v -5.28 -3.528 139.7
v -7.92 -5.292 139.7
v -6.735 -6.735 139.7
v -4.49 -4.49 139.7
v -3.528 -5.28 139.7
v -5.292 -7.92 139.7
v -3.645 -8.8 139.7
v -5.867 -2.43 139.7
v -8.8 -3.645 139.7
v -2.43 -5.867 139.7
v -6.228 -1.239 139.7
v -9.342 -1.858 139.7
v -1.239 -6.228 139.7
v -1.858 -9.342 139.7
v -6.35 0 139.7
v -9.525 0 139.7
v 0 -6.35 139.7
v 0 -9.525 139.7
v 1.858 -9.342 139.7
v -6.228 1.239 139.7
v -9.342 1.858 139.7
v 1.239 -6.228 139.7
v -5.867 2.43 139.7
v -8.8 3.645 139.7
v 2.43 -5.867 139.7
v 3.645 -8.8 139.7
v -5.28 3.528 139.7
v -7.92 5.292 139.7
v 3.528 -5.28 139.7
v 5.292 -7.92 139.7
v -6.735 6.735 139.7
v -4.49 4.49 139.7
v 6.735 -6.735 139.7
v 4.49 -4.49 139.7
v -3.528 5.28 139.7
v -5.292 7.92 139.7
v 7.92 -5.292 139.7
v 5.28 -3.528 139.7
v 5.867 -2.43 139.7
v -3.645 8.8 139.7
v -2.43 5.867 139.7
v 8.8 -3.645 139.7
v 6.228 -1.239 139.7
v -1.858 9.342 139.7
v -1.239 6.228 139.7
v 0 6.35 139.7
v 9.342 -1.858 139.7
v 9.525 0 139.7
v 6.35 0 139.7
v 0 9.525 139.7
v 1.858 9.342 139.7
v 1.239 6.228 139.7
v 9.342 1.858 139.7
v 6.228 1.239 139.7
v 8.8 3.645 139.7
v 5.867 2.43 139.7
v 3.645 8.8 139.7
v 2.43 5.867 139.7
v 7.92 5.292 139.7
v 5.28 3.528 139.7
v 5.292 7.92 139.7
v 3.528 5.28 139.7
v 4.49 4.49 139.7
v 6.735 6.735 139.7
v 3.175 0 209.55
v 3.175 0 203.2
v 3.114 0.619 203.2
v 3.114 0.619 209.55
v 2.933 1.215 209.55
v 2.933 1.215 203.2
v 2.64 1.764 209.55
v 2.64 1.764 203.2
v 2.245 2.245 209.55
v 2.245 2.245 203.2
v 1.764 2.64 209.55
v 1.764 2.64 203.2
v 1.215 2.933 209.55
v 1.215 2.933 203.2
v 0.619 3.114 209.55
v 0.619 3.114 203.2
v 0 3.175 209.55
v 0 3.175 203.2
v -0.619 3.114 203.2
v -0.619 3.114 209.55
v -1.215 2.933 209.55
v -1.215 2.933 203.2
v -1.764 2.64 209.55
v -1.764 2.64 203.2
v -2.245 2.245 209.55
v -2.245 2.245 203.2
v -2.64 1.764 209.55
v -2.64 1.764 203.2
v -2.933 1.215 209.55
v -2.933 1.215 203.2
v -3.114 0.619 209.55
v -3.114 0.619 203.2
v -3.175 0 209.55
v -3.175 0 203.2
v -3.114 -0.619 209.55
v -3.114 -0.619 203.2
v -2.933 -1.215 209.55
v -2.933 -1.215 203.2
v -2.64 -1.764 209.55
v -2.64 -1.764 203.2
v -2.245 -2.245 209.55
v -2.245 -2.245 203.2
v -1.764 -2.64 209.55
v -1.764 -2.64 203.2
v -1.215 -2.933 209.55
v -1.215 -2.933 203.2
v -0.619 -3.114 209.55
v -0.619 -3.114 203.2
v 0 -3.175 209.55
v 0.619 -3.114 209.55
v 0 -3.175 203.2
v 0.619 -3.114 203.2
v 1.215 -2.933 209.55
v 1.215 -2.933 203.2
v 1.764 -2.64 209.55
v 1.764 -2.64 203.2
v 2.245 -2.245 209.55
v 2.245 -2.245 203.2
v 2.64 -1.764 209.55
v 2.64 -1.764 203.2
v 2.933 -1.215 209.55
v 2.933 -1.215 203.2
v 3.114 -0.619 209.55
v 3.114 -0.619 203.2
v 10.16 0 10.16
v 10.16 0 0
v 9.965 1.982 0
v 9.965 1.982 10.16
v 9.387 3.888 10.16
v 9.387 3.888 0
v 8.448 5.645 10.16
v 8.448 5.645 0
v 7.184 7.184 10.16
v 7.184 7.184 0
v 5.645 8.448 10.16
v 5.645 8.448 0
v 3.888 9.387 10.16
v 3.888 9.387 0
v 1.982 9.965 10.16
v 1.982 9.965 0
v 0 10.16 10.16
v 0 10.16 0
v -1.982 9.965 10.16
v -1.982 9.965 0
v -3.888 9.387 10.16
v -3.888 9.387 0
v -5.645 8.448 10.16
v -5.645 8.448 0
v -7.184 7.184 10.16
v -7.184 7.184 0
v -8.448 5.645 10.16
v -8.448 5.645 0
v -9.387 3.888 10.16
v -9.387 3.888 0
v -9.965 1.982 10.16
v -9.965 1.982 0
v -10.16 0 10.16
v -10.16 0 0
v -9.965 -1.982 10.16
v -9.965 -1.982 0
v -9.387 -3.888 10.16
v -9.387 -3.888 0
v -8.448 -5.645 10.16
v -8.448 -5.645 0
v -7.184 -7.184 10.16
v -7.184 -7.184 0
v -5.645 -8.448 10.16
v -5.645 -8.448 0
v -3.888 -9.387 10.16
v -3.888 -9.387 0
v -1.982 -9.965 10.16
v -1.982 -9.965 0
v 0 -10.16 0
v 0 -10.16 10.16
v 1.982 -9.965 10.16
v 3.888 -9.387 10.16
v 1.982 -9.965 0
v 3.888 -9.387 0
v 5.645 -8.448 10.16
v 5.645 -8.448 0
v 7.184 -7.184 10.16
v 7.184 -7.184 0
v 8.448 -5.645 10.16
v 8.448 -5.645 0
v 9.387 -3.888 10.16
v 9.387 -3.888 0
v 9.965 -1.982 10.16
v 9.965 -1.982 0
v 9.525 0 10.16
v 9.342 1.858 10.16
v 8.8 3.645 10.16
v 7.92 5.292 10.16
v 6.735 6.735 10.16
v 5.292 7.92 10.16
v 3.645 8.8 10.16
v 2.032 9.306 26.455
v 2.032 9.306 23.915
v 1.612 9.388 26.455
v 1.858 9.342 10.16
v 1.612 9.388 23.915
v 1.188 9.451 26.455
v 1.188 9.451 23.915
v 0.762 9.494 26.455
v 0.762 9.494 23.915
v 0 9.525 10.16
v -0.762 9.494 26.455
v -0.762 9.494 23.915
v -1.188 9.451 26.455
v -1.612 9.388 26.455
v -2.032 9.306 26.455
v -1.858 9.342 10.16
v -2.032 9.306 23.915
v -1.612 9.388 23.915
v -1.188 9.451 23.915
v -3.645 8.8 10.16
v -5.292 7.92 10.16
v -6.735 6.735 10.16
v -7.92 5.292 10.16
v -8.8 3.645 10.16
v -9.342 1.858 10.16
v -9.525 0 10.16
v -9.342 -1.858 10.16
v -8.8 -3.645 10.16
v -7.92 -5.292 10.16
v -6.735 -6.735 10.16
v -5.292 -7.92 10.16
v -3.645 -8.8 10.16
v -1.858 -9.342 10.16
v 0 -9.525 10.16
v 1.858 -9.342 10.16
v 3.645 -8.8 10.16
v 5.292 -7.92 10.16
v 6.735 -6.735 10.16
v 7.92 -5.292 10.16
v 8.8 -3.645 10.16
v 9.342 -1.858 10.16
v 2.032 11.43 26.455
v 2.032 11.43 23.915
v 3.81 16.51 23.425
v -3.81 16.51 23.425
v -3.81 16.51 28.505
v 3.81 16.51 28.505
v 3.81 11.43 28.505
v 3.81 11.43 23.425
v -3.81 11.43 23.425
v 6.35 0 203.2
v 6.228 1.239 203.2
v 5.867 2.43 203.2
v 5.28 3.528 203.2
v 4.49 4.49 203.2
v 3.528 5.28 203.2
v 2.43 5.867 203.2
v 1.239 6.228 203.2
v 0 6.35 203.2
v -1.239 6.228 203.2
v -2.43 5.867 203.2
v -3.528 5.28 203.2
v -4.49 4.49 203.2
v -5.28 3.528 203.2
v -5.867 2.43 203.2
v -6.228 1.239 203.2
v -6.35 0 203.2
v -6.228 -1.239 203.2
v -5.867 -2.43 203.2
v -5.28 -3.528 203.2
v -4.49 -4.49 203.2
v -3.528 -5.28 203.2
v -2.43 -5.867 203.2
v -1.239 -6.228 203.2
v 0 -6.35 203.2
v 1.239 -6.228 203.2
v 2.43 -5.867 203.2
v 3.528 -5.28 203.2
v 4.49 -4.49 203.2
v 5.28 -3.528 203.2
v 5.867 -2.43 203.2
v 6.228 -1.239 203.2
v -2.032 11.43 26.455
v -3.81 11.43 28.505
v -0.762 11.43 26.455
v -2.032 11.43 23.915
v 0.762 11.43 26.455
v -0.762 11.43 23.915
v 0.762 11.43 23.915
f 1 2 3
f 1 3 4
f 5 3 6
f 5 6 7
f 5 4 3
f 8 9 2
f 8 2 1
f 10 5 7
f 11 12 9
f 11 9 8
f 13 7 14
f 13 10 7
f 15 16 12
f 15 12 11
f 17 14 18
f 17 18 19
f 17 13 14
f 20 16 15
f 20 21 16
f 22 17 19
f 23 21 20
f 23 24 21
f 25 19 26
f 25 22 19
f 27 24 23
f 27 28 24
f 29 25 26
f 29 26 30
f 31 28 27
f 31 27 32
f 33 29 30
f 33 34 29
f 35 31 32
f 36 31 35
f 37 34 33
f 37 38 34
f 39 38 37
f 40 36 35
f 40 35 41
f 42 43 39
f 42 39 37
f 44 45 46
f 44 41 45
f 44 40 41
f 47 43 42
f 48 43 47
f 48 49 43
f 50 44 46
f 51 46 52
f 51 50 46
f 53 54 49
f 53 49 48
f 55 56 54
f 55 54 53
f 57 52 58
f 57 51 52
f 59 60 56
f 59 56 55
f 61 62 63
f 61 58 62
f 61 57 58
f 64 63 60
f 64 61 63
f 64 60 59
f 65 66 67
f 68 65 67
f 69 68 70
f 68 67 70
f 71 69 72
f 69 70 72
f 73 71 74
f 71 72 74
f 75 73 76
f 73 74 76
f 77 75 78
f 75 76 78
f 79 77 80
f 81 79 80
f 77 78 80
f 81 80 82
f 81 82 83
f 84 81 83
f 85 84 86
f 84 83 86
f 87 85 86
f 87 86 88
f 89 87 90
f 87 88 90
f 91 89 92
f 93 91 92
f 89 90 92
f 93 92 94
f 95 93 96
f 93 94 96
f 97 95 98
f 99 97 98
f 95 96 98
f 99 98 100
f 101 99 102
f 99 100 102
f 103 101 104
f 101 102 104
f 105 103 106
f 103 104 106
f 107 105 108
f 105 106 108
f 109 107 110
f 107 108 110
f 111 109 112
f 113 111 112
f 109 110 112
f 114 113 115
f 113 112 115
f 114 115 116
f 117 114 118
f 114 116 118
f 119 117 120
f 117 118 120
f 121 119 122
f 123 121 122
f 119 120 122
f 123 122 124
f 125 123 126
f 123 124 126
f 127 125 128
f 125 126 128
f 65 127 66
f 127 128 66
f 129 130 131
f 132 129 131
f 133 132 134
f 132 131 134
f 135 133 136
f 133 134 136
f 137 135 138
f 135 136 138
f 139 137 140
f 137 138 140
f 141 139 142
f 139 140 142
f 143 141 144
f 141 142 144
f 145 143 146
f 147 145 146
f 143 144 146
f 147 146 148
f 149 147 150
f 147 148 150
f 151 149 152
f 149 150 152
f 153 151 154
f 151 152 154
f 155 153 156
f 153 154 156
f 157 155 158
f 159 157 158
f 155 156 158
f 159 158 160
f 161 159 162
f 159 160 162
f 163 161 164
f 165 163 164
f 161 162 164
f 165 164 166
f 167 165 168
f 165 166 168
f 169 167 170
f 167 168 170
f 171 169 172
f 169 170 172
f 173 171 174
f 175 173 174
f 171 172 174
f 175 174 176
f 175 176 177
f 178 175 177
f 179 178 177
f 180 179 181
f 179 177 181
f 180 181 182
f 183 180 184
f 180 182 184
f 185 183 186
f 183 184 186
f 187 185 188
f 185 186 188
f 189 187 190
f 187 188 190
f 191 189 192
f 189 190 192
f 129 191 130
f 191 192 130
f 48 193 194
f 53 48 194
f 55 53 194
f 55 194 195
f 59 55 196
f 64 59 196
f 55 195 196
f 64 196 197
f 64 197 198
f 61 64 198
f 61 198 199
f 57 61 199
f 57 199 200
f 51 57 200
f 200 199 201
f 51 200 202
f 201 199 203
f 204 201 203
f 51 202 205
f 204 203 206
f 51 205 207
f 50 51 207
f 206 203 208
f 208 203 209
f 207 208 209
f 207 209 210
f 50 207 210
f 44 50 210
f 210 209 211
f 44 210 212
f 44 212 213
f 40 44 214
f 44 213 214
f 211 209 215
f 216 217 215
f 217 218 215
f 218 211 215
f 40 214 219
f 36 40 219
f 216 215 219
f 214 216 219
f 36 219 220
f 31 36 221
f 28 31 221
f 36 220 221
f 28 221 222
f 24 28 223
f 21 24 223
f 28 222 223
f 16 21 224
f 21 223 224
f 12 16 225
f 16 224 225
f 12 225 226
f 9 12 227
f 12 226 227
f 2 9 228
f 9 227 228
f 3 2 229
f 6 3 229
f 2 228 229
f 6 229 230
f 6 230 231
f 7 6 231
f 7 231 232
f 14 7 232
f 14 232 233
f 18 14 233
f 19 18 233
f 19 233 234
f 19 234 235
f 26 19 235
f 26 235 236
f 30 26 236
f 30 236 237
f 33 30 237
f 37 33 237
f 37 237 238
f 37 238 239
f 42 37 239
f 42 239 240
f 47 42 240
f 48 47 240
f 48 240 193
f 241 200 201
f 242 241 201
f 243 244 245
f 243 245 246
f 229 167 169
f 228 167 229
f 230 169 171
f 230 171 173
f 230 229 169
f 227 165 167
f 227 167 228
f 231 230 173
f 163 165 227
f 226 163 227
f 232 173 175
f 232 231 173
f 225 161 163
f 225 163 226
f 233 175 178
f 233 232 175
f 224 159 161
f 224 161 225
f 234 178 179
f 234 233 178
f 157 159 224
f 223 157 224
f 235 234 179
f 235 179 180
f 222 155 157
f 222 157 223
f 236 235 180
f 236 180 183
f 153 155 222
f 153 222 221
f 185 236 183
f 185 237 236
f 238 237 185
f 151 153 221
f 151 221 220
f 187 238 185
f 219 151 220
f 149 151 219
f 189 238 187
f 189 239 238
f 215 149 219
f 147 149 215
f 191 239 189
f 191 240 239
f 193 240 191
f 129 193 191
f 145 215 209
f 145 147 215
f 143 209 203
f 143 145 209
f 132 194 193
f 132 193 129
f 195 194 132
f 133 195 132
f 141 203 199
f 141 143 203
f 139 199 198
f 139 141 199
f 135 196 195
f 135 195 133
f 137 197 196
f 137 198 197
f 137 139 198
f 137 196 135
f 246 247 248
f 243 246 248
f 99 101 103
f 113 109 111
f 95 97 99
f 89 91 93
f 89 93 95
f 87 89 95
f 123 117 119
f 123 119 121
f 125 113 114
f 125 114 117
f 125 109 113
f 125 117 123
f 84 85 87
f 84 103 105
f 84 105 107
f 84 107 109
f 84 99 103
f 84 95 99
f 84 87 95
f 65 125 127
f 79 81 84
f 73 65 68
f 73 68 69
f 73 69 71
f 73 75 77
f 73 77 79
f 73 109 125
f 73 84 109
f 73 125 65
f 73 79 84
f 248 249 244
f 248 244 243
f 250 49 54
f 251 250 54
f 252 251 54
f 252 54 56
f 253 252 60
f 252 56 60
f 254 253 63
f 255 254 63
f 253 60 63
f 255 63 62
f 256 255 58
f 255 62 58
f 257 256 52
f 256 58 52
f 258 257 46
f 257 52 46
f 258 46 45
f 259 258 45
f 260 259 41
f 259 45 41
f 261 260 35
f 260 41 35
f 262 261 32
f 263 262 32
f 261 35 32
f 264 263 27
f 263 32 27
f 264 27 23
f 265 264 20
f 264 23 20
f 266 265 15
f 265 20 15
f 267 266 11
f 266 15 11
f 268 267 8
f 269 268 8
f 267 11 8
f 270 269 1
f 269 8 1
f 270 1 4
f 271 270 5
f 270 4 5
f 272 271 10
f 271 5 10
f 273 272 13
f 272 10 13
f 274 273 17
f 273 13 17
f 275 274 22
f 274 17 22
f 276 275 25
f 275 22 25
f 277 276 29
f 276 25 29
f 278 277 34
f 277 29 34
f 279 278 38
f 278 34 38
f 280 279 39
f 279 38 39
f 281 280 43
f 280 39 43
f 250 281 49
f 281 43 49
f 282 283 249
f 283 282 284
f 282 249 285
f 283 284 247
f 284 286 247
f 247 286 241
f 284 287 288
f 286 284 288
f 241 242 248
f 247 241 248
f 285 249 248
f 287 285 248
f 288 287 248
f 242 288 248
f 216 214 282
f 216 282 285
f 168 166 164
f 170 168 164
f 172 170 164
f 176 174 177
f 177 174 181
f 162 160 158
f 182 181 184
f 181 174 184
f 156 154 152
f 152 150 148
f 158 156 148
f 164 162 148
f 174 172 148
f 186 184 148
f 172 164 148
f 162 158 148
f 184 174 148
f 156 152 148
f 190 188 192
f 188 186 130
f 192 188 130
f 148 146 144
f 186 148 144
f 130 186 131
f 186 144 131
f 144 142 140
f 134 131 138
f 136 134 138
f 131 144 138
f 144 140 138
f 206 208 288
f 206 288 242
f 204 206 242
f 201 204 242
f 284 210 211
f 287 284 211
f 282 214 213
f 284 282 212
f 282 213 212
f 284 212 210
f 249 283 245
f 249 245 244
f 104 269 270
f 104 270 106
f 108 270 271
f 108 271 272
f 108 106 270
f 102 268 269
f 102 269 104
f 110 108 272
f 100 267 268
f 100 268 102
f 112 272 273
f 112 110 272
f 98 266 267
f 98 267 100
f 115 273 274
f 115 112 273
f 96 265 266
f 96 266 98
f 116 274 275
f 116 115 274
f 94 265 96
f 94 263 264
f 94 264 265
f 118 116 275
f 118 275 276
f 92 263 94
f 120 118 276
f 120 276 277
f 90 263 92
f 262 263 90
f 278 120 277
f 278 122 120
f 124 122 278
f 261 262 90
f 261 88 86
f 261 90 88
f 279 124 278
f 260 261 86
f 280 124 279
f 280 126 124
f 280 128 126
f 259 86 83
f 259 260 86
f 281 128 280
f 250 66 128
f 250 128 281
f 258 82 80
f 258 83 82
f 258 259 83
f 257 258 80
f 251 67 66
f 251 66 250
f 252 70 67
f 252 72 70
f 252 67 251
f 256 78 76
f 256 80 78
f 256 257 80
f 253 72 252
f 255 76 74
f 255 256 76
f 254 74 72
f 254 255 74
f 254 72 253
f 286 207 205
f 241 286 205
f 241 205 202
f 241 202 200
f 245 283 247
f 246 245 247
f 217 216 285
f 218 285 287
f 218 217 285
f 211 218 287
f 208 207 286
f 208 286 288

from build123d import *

# Parameters (mm, degrees)
SKETCH2_R            = 10.16
BOSS_EXTRUDE1_DEPTH  = 10.16
SKETCH3_R            = 9.525
BOSS_EXTRUDE2_DEPTH  = 129.54
SKETCH4_R            = 6.35
BOSS_EXTRUDE4_DEPTH  = 63.5
SKETCH5_R            = 3.175
BOSS_EXTRUDE5_DEPTH  = 6.35
SKETCH8_W            = 1.27
SKETCH8_H            = 2.54
EXTRUDE_THIN1_DEPTH  = 8.89
SKETCH9_W            = 7.62
SKETCH9_H            = 5.08
BOSS_EXTRUDE14_DEPTH = 5.08


with BuildPart() as part:
    # Sketch2 → Boss-Extrude1 (new body)
    with BuildSketch(Plane.XY):
        Circle(SKETCH2_R)
    extrude(amount=BOSS_EXTRUDE1_DEPTH)

    # Sketch3 → Boss-Extrude2 (add)
    with BuildSketch(Plane.XY.offset(10.16)):
        Circle(SKETCH3_R)
    extrude(amount=BOSS_EXTRUDE2_DEPTH)

    # Sketch4 → Boss-Extrude4 (add)
    with BuildSketch(Plane.XY.offset(139.7)):
        Circle(SKETCH4_R)
    extrude(amount=BOSS_EXTRUDE4_DEPTH)

    # Sketch5 → Boss-Extrude5 (add)
    with BuildSketch(Plane.XY.offset(203.2)):
        Circle(SKETCH5_R)
    extrude(amount=BOSS_EXTRUDE5_DEPTH)

    # Sketch8 → Extrude-Thin1 (add)
    with BuildSketch(Plane(origin=(0, 2.54, 0), x_dir=(1, 0, 0), z_dir=(0, 1, 0))):
        with Locations((-1.397, -25.185428327)):
            Rectangle(SKETCH8_W, SKETCH8_H)
        with Locations((1.397, -25.185428327)):
            Rectangle(SKETCH8_W, SKETCH8_H)
    extrude(amount=EXTRUDE_THIN1_DEPTH)

    # Sketch9 → Boss-Extrude14 (add)
    with BuildSketch(Plane(origin=(0, 11.43, 0), x_dir=(1, 0, 0), z_dir=(0, 1, 0))):
        with Locations((0, -25.964513942)):
            Rectangle(SKETCH9_W, SKETCH9_H)
    extrude(amount=BOSS_EXTRUDE14_DEPTH)


solid = part.part
